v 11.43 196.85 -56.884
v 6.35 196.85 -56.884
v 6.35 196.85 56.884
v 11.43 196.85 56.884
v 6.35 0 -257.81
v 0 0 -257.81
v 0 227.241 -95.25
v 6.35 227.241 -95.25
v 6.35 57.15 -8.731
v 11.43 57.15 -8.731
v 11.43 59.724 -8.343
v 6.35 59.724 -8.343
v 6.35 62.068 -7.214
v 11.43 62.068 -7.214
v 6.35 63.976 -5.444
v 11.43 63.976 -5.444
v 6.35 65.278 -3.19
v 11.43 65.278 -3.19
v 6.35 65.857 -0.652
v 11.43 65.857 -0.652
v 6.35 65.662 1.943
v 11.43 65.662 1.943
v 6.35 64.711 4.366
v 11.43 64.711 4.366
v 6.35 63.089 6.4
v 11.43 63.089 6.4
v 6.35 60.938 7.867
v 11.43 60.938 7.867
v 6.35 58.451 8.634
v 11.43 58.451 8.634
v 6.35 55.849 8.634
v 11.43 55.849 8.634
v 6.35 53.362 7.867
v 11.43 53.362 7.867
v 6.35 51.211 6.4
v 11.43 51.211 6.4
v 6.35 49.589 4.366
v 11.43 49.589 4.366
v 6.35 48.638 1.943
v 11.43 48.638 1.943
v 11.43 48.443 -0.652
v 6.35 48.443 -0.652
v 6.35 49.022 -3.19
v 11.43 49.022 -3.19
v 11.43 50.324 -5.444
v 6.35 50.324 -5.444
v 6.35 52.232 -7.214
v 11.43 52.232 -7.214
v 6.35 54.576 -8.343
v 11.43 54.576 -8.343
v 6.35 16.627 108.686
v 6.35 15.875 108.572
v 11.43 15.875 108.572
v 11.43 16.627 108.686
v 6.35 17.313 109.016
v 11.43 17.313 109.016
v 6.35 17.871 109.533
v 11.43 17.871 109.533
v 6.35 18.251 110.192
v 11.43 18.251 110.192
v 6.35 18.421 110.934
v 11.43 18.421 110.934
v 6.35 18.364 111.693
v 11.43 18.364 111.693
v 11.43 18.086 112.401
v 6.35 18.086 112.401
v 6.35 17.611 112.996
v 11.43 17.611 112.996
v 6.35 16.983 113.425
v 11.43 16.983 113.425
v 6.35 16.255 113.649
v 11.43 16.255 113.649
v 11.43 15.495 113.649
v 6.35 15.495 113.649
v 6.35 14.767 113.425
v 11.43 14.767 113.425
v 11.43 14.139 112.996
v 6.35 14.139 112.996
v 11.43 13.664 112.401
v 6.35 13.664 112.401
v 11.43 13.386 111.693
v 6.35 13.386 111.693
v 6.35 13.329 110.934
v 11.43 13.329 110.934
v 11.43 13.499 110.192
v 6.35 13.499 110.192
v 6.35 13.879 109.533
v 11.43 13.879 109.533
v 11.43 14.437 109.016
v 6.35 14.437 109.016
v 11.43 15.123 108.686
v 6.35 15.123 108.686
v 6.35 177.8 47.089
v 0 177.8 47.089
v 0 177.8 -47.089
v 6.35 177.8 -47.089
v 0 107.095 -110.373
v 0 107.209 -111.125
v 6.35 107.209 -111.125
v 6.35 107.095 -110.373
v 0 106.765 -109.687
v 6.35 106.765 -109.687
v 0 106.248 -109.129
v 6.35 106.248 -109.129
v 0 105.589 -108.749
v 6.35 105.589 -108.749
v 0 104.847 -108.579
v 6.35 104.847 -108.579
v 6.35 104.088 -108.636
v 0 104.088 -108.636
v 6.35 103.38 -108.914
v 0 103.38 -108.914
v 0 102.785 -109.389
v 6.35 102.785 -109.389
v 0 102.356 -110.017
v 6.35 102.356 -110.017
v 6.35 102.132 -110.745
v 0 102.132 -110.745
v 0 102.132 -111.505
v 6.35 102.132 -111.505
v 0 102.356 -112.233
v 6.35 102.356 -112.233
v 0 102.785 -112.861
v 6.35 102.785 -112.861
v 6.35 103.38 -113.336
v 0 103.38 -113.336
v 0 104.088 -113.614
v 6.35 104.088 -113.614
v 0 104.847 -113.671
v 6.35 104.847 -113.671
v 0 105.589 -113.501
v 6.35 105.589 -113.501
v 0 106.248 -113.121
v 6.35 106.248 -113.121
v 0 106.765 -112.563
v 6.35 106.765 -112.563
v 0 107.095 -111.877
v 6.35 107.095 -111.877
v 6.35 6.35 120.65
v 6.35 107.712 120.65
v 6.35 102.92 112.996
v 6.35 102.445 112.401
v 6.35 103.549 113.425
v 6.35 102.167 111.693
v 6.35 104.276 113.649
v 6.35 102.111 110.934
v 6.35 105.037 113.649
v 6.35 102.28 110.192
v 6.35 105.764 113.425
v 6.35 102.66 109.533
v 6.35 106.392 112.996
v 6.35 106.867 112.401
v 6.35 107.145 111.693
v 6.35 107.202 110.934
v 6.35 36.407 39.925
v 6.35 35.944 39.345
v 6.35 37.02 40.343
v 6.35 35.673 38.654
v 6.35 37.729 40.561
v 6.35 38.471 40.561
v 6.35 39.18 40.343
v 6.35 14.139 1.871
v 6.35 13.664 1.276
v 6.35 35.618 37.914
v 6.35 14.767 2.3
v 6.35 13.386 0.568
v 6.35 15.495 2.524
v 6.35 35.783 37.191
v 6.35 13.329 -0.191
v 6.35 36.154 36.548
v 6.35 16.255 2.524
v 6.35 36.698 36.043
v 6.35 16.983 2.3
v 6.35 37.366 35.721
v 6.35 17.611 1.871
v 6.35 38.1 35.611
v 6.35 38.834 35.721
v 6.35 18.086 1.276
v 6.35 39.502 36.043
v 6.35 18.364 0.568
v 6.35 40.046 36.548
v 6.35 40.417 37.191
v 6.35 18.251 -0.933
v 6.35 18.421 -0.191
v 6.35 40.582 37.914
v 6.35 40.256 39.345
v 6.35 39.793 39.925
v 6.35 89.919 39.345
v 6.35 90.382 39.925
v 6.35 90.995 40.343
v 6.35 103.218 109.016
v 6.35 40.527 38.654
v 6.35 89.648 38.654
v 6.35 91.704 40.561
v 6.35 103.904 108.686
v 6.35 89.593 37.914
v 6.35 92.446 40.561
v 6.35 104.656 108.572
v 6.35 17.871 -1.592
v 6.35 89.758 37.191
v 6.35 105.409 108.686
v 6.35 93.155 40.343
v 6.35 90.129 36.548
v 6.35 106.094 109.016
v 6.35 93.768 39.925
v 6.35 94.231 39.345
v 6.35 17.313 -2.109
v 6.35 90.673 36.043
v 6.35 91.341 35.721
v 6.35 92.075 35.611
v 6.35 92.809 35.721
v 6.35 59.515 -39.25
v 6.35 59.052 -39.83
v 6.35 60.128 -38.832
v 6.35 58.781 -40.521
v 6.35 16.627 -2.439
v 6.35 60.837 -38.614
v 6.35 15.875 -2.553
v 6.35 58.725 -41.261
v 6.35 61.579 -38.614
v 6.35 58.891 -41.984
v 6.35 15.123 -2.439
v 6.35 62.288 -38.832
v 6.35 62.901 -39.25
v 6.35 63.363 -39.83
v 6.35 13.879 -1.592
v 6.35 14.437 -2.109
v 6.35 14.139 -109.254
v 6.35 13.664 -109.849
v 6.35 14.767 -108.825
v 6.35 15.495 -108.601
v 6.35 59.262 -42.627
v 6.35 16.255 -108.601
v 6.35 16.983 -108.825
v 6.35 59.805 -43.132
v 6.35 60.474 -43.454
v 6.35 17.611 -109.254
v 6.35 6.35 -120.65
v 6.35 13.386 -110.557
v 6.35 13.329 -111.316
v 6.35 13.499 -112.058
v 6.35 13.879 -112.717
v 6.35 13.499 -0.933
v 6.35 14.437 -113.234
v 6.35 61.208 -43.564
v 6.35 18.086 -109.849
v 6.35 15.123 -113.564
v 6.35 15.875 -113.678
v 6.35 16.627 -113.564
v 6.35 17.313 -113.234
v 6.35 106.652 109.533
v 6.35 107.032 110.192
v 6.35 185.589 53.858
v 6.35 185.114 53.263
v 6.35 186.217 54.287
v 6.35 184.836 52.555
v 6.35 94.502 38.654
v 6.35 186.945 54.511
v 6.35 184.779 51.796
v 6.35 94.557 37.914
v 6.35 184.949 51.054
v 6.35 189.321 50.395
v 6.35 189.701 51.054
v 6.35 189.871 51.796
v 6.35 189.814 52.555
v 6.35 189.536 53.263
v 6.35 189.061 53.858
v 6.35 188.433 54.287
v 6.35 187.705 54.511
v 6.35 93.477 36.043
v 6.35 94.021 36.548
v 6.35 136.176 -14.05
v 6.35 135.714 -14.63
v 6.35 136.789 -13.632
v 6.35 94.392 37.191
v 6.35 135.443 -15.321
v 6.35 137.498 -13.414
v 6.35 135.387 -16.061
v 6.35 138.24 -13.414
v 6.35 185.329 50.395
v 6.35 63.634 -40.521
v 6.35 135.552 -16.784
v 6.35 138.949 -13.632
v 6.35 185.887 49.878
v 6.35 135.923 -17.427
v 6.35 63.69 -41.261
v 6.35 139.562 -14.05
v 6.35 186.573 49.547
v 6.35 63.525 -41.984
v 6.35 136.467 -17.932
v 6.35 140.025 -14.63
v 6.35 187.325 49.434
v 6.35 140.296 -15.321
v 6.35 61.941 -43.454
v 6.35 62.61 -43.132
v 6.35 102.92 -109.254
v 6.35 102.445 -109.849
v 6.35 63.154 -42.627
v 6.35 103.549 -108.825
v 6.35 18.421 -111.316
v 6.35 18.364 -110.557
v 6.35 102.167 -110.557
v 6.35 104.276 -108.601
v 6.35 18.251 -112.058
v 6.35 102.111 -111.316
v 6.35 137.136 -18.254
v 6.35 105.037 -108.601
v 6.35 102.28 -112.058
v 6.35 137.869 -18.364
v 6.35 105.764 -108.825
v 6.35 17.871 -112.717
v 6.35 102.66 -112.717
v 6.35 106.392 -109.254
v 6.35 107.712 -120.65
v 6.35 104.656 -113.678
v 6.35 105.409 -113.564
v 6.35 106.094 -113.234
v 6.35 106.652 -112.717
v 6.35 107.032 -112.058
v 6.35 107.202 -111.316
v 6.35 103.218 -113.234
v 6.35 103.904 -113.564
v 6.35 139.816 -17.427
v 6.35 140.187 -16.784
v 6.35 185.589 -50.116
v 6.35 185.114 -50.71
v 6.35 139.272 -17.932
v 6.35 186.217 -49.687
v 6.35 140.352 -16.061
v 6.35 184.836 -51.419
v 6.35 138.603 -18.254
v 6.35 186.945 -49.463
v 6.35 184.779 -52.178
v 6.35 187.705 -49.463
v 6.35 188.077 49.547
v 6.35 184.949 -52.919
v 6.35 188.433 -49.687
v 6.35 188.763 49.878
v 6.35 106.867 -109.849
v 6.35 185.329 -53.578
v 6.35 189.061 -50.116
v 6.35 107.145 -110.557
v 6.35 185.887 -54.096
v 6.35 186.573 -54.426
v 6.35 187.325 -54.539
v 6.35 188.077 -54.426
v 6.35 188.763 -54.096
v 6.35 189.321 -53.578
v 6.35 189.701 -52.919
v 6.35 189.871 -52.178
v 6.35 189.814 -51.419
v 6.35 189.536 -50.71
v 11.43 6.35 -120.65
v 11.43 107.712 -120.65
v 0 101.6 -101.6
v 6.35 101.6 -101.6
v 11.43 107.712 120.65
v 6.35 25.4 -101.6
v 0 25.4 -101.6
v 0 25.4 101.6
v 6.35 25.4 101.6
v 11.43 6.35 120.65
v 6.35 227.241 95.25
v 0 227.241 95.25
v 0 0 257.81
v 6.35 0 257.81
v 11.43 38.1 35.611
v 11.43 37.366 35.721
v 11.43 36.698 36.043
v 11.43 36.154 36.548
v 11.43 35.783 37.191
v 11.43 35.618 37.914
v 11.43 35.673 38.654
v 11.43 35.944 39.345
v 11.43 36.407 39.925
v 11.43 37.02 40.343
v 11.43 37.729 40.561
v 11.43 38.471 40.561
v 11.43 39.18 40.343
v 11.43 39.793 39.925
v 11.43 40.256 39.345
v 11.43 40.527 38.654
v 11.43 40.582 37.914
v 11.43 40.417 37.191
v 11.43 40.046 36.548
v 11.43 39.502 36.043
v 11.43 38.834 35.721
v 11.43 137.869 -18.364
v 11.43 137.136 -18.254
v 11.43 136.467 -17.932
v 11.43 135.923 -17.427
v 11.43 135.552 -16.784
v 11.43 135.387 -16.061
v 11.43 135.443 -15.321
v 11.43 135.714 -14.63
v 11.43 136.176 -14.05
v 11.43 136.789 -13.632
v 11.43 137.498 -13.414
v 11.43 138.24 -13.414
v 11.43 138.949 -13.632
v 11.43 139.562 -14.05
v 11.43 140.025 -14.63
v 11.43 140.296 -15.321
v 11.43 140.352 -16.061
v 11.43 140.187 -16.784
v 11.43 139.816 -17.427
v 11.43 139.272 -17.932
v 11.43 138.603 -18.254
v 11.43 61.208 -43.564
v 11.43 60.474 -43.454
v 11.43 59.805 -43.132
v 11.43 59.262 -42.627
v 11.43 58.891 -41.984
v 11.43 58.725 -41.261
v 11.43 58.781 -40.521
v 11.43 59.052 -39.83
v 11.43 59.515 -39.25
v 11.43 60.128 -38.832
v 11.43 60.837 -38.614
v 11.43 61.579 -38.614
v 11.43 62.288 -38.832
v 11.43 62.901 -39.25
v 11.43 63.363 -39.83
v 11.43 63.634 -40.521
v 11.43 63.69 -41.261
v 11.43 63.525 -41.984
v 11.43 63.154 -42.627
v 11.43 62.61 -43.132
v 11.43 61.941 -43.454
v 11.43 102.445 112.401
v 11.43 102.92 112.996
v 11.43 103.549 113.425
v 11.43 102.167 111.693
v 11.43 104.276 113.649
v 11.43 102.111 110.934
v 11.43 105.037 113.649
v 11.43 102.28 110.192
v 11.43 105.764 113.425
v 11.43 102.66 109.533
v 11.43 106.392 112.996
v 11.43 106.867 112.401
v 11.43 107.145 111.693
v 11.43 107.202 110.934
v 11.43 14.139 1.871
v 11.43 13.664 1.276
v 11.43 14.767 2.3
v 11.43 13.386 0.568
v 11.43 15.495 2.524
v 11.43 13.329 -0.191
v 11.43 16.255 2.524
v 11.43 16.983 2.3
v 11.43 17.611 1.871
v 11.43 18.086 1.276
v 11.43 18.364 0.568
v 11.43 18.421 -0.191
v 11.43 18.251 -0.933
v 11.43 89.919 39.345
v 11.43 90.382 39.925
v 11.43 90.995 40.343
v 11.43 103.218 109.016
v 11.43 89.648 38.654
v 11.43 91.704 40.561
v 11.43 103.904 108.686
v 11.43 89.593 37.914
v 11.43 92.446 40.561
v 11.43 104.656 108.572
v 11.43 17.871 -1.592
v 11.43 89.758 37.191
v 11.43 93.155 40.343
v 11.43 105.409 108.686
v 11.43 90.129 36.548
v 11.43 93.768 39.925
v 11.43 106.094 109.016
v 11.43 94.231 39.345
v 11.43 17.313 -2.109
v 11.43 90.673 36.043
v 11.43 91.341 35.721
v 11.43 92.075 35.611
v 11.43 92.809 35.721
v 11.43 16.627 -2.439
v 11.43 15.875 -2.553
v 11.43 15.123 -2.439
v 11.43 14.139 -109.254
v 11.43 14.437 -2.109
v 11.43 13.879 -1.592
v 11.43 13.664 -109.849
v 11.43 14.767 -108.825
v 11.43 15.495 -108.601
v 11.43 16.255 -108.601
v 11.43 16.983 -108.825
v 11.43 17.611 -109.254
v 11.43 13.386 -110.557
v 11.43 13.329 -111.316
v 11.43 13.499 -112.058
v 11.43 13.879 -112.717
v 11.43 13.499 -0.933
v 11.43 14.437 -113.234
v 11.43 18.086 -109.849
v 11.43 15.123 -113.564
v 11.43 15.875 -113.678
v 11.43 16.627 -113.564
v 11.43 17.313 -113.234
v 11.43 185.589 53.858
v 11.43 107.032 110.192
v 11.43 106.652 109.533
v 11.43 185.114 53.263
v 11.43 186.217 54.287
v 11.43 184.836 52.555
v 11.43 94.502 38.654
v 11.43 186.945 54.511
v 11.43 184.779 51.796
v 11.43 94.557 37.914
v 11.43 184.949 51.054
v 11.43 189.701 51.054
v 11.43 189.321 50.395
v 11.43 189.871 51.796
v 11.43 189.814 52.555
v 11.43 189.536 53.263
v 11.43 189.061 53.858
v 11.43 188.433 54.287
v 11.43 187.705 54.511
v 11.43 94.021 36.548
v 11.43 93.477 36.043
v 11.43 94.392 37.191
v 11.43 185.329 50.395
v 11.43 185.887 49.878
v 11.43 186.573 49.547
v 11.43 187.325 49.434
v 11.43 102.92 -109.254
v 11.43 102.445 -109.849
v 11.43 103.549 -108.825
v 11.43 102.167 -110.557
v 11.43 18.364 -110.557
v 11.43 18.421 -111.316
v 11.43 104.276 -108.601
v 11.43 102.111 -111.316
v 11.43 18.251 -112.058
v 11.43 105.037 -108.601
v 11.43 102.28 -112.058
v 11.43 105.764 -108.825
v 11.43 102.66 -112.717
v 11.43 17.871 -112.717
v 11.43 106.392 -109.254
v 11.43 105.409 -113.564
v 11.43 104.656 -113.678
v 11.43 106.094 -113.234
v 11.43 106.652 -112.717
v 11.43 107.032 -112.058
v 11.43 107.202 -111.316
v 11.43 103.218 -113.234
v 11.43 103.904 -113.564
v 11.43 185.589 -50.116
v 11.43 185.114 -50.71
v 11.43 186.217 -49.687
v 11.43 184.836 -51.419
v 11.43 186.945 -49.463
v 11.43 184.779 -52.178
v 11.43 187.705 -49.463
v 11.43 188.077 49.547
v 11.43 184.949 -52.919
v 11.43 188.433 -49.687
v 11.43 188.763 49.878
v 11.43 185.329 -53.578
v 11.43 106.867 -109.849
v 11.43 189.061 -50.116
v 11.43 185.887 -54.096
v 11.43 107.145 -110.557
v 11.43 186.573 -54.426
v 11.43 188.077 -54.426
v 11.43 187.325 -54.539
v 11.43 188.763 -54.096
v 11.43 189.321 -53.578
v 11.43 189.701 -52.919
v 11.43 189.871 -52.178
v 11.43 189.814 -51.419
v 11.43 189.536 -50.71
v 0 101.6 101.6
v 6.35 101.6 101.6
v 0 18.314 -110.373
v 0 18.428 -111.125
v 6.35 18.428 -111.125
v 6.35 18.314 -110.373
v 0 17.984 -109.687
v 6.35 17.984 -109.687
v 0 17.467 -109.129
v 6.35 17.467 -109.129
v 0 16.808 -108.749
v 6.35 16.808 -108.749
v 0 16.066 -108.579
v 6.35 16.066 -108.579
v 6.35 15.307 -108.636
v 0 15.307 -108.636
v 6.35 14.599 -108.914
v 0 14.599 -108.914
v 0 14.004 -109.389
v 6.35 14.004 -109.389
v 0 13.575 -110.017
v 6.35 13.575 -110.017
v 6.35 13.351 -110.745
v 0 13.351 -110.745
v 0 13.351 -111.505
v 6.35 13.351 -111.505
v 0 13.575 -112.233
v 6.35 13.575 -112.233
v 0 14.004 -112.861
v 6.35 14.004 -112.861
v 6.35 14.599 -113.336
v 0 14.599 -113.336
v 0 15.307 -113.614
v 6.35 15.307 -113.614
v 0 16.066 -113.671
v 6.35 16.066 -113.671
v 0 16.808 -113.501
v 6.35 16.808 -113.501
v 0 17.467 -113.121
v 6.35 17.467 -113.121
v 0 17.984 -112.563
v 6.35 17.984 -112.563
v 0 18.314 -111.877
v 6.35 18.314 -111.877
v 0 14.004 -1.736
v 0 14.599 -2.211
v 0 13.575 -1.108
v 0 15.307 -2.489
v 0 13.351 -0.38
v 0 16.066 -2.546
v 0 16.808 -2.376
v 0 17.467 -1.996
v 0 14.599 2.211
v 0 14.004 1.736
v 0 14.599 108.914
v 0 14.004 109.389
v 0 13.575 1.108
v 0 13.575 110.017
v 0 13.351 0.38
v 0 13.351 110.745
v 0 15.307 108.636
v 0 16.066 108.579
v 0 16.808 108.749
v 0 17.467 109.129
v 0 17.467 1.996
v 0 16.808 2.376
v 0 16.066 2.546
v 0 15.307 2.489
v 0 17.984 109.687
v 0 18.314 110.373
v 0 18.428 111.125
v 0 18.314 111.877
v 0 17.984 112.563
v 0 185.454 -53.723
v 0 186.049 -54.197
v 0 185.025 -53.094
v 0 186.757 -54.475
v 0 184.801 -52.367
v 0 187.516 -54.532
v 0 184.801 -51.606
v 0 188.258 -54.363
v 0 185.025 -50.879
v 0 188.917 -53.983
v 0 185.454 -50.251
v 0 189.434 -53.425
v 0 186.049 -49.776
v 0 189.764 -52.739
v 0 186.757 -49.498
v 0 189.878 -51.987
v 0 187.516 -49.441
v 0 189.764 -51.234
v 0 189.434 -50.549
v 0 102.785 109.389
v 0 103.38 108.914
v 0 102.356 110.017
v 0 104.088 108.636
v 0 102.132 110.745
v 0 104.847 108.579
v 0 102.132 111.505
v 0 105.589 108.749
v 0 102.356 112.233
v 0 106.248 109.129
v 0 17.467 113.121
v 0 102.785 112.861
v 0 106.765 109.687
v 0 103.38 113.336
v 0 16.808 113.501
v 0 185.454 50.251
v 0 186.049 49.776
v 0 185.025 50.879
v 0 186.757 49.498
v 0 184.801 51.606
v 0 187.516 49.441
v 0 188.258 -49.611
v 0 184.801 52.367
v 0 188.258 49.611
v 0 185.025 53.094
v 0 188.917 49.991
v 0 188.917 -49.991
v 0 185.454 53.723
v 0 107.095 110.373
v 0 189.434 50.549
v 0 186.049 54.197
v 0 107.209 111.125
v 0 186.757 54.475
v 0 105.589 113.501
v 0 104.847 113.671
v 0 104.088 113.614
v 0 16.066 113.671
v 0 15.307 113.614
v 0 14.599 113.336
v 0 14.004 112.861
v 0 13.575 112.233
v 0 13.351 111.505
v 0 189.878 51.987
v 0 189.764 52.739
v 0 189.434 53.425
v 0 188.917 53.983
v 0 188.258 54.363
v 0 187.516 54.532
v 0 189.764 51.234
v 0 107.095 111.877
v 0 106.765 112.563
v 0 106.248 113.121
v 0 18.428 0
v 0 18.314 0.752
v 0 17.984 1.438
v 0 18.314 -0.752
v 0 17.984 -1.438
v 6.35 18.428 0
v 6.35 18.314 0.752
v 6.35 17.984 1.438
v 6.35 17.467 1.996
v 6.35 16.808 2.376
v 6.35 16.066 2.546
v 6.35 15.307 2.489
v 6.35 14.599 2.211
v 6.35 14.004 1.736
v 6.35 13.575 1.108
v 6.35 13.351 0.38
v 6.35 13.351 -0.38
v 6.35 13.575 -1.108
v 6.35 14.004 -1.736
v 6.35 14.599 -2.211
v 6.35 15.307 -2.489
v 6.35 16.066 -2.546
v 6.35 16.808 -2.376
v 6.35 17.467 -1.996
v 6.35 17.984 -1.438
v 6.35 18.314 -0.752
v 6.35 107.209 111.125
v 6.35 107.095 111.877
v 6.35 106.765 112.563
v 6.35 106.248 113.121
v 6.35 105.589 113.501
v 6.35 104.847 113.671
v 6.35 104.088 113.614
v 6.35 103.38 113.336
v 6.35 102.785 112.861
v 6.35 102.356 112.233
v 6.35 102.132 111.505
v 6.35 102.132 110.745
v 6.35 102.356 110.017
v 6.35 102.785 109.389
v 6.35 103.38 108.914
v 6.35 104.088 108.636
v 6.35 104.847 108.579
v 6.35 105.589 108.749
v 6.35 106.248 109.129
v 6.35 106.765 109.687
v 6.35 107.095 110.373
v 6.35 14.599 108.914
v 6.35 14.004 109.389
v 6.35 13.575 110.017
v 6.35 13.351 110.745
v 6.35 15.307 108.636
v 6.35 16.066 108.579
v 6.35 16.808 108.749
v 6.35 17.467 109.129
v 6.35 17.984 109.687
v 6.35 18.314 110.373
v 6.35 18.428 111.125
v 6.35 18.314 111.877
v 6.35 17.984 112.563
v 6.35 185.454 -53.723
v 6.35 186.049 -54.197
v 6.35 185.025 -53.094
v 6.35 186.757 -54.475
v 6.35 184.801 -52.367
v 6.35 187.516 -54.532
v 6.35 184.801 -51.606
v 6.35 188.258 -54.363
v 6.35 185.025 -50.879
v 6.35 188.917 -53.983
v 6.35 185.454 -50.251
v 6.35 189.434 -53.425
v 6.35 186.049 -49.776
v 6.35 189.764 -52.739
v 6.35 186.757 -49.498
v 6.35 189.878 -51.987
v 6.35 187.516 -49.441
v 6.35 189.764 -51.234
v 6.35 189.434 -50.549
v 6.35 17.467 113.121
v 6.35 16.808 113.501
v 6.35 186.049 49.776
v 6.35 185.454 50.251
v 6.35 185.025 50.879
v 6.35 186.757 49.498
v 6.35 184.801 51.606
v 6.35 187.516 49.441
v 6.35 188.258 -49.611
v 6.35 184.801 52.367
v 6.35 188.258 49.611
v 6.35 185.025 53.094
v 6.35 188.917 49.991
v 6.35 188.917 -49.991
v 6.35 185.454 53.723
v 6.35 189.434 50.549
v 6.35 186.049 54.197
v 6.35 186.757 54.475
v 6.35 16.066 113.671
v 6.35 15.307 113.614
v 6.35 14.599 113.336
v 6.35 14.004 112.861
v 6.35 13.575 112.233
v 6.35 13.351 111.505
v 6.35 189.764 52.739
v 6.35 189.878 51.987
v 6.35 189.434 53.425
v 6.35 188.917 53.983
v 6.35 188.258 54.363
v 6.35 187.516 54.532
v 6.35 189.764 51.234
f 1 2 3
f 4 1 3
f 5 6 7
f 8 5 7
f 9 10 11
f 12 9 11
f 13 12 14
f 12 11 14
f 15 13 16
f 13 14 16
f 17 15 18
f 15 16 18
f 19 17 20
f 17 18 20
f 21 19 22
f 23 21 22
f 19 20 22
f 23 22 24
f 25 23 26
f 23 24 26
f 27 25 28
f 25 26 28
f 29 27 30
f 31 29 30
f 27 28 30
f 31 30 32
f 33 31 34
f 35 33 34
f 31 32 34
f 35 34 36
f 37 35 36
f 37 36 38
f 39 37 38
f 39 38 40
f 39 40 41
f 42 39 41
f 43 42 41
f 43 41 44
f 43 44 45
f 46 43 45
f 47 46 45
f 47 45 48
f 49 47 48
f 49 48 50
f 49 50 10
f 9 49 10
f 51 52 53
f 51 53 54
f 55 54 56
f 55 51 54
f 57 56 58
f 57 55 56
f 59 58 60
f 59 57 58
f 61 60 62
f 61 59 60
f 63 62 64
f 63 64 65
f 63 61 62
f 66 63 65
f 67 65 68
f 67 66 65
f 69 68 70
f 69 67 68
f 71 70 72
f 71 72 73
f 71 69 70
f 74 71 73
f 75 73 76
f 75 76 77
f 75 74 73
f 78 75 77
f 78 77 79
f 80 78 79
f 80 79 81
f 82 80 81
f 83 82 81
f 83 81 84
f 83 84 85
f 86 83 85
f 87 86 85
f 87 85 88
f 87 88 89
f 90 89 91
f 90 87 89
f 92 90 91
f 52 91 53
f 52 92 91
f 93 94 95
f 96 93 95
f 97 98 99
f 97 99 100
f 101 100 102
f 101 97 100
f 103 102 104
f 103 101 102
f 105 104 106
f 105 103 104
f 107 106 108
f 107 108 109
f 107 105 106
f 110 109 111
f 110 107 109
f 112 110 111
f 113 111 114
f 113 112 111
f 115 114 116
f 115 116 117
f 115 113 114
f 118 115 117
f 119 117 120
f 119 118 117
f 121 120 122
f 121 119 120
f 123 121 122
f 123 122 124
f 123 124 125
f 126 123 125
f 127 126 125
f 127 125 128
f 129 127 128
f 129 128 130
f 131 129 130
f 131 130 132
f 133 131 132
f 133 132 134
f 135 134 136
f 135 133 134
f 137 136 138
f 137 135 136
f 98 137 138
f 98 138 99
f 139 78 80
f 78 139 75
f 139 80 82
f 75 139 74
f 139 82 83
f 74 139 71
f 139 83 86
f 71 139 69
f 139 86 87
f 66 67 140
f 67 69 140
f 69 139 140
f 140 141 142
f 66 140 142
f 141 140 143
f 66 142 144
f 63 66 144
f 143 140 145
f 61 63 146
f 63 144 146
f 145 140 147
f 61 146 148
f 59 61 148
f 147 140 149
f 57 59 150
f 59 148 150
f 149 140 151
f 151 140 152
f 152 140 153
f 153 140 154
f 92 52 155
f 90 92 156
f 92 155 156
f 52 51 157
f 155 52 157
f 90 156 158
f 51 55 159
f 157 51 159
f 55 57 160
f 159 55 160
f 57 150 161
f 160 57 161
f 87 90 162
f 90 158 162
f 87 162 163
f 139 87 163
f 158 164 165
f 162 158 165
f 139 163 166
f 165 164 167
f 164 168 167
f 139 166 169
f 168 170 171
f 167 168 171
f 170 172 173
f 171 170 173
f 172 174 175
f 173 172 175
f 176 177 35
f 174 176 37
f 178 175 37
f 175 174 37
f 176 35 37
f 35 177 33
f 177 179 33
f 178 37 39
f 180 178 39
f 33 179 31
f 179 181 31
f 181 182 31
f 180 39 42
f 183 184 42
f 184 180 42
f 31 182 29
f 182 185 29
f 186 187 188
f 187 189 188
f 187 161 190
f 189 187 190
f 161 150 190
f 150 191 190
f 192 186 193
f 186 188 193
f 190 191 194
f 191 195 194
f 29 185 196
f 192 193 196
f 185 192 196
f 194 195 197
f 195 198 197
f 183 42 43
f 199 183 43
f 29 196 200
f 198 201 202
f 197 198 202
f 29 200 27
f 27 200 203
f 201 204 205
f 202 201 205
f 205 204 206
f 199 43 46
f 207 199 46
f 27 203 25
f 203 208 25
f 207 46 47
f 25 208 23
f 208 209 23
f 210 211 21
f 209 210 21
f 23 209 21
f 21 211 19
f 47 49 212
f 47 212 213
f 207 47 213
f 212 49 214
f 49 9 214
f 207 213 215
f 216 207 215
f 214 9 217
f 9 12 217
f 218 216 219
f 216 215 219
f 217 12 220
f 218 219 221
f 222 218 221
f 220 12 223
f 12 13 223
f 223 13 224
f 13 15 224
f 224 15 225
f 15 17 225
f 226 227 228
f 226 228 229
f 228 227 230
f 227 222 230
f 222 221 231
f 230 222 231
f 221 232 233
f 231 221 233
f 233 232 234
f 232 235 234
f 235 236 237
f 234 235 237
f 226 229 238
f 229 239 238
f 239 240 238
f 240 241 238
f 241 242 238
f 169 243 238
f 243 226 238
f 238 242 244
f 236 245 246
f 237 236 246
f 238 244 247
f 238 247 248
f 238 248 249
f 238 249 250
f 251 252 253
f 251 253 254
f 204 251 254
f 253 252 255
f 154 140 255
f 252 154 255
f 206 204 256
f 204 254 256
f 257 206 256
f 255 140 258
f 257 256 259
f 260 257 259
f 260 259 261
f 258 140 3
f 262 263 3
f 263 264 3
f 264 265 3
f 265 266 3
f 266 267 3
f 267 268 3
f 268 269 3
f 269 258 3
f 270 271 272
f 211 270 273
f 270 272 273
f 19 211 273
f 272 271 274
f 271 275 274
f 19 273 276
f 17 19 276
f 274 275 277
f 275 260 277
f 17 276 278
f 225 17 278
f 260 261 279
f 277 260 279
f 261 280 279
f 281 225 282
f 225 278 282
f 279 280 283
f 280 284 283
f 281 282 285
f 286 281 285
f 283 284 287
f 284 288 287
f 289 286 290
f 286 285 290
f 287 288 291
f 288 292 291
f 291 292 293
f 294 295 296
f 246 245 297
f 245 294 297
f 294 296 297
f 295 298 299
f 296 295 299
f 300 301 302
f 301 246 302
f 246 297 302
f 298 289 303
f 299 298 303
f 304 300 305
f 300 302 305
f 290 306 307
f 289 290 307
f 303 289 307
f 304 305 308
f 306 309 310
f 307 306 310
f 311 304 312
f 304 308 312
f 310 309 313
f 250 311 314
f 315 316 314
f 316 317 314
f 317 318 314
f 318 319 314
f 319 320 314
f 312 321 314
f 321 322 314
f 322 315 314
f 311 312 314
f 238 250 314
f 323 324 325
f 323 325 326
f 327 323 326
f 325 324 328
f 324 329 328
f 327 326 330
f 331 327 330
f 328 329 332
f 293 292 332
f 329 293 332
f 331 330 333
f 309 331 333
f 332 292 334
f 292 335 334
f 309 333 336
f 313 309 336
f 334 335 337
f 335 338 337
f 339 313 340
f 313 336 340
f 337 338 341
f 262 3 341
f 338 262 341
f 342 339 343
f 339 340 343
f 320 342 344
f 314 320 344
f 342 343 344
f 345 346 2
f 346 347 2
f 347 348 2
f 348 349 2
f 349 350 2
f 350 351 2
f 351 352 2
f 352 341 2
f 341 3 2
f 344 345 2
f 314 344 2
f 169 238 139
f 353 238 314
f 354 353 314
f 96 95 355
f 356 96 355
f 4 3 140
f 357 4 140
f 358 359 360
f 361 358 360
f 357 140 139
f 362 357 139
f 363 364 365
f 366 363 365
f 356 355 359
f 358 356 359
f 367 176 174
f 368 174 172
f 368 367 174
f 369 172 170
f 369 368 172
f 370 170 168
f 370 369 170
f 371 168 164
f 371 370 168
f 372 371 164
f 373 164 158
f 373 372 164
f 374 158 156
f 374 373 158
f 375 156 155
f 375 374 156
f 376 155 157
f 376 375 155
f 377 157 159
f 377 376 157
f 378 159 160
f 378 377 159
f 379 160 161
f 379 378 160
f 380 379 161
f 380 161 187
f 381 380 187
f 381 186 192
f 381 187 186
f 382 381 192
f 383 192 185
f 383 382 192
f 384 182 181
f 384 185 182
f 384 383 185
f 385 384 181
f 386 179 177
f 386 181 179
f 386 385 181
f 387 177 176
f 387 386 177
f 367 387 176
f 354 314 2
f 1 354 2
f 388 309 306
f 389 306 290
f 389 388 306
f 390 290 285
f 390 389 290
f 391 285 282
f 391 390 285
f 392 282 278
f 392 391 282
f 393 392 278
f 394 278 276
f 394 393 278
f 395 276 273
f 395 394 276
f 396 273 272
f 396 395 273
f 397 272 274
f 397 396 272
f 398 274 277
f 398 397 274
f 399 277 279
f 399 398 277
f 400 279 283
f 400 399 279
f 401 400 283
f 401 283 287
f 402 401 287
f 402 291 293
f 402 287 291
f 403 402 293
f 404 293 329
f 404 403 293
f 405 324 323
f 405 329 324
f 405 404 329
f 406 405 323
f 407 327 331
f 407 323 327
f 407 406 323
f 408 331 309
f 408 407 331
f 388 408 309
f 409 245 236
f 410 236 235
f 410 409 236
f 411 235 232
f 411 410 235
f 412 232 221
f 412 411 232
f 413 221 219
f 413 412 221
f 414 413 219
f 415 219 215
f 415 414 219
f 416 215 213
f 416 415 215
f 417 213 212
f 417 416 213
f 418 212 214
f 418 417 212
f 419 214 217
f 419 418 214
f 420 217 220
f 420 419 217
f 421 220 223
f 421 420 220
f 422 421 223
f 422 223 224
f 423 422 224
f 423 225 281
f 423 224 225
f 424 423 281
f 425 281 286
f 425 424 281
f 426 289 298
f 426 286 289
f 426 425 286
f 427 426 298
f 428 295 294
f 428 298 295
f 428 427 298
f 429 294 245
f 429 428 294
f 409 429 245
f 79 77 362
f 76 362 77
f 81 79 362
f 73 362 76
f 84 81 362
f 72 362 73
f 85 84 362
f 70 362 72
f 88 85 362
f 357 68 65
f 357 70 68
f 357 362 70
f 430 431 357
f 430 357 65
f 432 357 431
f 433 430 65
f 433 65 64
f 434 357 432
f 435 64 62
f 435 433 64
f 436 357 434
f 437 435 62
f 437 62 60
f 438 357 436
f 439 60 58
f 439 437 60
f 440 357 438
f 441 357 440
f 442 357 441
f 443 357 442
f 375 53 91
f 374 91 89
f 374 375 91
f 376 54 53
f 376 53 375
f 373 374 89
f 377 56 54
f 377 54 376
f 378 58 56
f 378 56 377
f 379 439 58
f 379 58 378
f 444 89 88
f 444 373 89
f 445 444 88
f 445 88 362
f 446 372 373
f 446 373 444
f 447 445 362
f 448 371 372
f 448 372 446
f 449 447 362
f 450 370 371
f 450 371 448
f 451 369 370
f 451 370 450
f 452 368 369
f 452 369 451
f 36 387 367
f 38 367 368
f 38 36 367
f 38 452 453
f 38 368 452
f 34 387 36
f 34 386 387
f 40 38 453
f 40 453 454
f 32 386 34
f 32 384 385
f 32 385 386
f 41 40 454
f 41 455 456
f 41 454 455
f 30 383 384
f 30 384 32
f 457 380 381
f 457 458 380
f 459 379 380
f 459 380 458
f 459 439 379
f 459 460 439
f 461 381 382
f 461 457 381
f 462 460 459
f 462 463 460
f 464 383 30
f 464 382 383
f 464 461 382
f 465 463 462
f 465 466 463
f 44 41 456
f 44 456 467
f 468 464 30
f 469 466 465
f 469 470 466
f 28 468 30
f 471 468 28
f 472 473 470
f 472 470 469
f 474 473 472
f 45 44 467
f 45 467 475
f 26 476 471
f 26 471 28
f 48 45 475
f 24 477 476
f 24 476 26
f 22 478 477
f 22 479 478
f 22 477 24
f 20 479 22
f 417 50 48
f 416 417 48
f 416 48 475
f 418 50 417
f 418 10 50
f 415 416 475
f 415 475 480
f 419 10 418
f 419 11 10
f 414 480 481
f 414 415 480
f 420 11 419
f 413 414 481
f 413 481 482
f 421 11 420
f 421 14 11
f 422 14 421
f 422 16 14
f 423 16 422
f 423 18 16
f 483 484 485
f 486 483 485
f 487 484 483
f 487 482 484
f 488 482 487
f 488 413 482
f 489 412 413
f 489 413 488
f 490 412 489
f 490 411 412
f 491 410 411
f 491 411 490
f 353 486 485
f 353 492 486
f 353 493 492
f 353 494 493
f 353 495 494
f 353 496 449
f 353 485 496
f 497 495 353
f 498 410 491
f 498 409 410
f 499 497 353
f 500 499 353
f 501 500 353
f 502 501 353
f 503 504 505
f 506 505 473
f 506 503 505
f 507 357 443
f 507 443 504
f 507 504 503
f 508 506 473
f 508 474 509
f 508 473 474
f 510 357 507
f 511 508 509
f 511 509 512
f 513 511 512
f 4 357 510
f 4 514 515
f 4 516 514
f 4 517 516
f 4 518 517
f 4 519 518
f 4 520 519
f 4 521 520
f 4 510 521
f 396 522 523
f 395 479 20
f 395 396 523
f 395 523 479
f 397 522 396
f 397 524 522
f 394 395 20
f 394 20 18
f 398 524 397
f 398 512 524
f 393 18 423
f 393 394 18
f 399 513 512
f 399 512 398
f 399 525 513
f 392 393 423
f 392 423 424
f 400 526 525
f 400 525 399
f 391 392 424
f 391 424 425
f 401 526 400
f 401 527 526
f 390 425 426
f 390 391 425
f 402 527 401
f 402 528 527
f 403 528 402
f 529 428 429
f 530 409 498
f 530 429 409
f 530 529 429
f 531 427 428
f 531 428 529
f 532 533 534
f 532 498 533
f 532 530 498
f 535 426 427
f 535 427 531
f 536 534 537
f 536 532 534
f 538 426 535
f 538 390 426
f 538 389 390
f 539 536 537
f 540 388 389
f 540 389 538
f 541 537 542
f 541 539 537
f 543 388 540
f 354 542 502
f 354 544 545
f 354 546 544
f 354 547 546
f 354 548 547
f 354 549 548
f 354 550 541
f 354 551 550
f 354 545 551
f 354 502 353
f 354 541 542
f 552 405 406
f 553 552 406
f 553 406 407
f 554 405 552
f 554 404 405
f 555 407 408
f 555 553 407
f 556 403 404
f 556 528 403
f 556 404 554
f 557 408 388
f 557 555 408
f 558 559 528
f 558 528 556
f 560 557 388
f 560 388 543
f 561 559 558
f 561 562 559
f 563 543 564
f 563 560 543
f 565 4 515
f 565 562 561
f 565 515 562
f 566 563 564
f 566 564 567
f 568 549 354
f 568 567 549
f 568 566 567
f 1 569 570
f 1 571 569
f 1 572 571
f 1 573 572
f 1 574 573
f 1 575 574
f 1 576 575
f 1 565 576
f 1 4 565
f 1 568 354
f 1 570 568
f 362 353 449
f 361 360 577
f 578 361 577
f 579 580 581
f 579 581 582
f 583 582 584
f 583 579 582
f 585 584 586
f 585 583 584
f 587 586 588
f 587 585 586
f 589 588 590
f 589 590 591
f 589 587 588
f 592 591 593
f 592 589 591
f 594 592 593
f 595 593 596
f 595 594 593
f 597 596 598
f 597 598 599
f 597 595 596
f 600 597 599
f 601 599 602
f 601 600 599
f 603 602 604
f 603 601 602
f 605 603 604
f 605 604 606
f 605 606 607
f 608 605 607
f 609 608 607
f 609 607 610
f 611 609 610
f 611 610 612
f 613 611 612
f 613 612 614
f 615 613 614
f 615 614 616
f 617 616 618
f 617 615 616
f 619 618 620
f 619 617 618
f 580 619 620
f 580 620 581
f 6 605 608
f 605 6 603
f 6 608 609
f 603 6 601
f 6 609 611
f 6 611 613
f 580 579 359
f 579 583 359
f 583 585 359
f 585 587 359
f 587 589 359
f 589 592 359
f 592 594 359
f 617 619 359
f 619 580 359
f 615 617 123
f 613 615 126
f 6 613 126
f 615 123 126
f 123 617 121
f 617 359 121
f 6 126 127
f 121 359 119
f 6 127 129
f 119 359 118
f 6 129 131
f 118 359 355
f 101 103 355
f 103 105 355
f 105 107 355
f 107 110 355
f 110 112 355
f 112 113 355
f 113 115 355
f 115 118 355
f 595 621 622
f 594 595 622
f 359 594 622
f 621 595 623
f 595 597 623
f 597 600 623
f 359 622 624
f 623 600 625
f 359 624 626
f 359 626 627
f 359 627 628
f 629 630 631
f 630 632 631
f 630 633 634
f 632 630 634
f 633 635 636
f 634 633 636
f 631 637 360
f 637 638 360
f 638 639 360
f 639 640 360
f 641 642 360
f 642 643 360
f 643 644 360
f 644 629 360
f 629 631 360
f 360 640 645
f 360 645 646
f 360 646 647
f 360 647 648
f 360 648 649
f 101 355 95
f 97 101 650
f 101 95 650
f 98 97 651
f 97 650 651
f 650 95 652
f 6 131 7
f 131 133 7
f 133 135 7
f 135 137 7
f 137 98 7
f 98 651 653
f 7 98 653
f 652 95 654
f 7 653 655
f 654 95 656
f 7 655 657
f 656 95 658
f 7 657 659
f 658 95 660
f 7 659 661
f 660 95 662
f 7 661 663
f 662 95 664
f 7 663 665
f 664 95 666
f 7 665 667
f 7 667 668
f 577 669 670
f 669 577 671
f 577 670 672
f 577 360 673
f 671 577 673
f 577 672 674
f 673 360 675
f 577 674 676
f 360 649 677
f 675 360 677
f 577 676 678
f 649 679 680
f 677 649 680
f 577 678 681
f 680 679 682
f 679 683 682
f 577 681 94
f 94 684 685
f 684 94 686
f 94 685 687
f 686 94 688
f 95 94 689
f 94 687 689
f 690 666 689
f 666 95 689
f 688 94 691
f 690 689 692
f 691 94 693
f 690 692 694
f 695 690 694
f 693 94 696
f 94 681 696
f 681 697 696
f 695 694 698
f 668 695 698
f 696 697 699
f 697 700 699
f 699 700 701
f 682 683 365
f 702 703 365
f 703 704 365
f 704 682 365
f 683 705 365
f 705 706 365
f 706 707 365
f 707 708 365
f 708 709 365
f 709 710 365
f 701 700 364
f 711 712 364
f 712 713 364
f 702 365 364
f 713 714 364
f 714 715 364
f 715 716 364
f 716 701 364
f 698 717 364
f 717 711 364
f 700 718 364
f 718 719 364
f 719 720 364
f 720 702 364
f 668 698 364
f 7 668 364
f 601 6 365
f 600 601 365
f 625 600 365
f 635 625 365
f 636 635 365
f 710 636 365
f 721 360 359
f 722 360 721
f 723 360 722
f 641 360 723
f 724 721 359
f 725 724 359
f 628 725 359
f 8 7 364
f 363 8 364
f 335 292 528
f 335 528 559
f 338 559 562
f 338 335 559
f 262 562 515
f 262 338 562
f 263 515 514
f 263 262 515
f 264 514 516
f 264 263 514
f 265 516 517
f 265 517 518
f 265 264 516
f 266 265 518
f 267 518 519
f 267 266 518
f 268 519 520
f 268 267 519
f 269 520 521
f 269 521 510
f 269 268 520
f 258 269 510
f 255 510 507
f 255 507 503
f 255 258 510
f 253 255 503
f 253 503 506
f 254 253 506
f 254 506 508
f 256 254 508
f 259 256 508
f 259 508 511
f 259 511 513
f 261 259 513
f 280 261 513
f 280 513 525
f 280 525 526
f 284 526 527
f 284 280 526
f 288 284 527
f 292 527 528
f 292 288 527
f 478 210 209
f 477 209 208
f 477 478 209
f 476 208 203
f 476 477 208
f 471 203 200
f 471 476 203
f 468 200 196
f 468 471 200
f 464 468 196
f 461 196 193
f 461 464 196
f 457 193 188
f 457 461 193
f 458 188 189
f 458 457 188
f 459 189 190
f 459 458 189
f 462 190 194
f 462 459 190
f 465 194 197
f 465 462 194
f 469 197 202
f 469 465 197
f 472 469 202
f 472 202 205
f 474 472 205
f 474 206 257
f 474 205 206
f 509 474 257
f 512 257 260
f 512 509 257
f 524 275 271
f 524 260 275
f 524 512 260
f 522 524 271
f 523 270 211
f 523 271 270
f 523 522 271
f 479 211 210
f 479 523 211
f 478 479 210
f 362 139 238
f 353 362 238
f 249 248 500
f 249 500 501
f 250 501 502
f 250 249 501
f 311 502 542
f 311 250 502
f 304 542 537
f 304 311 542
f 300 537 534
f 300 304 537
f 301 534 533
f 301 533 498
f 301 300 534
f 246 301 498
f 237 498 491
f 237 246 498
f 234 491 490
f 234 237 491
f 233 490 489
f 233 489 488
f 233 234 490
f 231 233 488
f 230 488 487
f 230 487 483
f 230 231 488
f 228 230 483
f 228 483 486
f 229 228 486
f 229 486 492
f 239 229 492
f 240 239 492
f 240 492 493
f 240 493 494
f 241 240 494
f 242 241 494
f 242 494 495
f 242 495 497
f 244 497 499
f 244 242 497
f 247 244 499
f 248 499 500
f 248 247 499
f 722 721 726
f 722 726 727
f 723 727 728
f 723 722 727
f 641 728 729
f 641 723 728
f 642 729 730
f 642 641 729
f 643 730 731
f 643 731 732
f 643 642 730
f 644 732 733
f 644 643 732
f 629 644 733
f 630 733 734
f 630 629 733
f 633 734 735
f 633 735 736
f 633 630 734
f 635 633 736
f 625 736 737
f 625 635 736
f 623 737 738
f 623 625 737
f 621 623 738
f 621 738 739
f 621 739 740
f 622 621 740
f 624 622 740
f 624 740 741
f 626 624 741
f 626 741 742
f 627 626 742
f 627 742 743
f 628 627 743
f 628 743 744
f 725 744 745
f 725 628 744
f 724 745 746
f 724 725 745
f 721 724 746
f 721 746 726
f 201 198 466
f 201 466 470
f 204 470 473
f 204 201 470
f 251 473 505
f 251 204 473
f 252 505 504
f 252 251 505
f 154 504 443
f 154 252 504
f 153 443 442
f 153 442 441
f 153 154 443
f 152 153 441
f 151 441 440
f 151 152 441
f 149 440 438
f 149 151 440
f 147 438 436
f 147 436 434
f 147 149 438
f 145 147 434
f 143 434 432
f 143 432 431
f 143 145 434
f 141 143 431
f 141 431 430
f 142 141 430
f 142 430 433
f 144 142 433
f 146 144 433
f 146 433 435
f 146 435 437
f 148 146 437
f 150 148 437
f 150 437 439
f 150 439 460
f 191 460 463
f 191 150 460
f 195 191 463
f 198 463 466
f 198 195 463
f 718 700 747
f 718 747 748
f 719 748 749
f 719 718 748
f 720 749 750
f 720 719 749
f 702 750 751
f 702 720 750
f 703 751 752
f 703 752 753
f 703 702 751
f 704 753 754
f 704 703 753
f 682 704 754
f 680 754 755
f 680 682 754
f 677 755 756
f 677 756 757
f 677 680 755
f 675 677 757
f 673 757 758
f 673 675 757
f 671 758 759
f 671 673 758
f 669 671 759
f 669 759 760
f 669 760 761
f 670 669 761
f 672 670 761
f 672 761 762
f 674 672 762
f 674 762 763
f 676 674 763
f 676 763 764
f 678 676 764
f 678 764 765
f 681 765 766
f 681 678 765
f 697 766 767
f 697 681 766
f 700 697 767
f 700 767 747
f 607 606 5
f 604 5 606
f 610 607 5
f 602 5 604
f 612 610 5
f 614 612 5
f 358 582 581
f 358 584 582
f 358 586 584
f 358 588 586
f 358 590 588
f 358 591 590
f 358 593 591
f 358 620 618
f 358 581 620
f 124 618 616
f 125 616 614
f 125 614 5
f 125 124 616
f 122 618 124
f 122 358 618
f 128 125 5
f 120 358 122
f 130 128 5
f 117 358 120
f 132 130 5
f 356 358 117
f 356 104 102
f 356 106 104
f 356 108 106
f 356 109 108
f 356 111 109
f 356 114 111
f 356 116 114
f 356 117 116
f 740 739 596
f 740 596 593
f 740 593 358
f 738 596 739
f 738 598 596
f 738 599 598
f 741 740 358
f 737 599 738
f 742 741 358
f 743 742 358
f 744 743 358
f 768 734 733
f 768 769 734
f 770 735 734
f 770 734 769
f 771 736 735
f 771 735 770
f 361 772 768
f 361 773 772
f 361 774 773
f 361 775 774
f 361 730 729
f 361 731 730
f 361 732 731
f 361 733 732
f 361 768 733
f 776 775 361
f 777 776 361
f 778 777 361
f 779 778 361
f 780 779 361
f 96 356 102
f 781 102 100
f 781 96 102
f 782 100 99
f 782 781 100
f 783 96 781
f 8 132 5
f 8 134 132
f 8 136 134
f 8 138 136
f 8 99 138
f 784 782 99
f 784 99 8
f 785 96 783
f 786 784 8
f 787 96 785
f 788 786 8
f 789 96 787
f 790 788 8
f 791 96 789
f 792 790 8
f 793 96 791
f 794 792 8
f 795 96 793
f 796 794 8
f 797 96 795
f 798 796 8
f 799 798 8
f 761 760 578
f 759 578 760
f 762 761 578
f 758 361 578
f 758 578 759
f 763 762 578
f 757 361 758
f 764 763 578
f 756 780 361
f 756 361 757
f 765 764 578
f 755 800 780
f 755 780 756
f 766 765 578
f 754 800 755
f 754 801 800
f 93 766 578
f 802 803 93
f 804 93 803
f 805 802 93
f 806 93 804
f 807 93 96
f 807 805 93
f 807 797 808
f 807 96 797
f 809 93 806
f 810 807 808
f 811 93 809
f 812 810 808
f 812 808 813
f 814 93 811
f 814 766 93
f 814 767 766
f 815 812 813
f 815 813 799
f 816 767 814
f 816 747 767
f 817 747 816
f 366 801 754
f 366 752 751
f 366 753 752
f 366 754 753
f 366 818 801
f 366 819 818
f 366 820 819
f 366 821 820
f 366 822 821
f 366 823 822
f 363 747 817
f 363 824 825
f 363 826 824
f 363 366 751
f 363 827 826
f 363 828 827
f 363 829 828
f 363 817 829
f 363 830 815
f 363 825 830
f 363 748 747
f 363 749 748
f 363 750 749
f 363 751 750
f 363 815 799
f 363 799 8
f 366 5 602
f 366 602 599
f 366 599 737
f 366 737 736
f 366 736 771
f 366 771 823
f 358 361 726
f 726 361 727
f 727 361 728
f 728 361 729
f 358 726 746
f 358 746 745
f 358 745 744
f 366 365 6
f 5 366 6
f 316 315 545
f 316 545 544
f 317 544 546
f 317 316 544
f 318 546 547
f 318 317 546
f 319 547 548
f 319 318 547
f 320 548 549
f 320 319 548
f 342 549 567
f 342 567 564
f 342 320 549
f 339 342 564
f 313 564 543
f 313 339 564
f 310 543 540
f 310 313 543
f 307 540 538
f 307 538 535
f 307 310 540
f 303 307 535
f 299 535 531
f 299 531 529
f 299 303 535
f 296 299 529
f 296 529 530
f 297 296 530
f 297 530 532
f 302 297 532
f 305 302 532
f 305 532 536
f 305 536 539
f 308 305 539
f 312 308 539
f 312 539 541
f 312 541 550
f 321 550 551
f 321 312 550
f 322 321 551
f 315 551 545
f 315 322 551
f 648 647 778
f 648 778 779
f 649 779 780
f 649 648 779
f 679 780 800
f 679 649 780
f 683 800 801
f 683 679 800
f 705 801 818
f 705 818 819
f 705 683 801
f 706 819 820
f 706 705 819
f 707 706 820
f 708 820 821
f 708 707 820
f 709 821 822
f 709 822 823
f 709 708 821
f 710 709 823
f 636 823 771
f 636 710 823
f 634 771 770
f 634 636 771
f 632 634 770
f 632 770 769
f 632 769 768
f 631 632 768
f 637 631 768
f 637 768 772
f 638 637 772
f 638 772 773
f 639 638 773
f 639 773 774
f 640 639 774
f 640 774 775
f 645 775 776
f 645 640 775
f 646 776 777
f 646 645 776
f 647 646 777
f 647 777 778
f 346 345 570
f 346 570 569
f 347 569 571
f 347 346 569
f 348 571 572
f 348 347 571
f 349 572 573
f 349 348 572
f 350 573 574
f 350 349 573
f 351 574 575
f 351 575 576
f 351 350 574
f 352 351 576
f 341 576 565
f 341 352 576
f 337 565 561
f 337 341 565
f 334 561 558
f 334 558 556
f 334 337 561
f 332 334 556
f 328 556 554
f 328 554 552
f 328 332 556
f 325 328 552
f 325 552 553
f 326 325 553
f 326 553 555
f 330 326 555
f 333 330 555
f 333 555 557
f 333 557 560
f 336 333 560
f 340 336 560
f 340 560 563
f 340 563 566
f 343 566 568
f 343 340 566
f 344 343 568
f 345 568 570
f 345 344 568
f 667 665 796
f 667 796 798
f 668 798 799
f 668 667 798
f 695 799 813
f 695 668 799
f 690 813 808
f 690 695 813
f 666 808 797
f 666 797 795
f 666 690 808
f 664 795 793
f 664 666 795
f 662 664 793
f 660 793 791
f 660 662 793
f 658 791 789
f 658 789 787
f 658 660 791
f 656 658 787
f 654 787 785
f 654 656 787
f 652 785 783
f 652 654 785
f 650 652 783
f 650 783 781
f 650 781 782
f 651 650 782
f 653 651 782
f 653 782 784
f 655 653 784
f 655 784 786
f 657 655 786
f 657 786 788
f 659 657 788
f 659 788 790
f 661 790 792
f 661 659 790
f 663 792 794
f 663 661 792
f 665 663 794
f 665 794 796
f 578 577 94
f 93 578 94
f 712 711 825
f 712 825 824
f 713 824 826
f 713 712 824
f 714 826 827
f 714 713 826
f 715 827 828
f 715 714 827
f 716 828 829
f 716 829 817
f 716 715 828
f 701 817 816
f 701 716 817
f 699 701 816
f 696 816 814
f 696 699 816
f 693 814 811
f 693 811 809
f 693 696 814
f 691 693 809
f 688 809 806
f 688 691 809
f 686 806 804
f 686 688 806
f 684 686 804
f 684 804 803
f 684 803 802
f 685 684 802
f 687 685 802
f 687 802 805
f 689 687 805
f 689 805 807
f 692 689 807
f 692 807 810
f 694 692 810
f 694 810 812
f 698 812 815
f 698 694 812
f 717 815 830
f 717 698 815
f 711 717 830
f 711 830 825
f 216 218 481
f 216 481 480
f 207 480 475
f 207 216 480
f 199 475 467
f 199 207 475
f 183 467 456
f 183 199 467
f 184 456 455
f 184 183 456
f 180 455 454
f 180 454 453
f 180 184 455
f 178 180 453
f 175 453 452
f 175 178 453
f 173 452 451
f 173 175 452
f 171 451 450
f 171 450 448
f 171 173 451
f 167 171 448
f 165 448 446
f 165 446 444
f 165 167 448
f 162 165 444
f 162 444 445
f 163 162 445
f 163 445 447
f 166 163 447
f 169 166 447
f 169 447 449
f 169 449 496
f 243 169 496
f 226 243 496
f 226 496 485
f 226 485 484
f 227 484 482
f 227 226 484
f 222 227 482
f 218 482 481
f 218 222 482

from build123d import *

# Parameters (mm, degrees)
ANGLEDBALLAST_DECKFRONT_OUTLINE_R = 2.5527
ANGLEDBALLAST_DECKFRONT_DEPTH     = 6.35
SKETCH1_R                         = 2.5527
BOSS_EXTRUDE1_DEPTH               = 5.08
SKETCH2_R                         = 8.73125
CUT_EXTRUDE1_DEPTH                = 344.853526084
F_10_CLEARANCE_HOLE1_AT_2_COUNT   = 2
F_10_CLEARANCE_HOLE1_AT_2_PITCH   = 53.975
F_10_CLEARANCE_HOLE1_AT_3_COUNT   = 2
F_10_CLEARANCE_HOLE1_AT_3_PITCH   = 113.433816282
F_10_CLEARANCE_HOLE1_AT_4_COUNT   = 2
F_10_CLEARANCE_HOLE1_AT_4_PITCH   = 82.478211039


# Read off the part's stored shape, not the designer's step: AngledBallast_DeckFront
with BuildPart() as part:
    # AngledBallast_DeckFront outline → AngledBallast_DeckFront (new body)
    with BuildSketch(Plane.YZ):
        Polygon((227.241295543, 95.25), (0, 257.81), (0, -257.81), (227.241295543, -95.25), align=None)
        with Locations((15.875, -111.125)):
            Circle(ANGLEDBALLAST_DECKFRONT_OUTLINE_R, mode=Mode.SUBTRACT)
        with Locations((104.656174089, -111.125)):
            Circle(ANGLEDBALLAST_DECKFRONT_OUTLINE_R, mode=Mode.SUBTRACT)
        with Locations((187.325, -51.986786112)):
            Circle(ANGLEDBALLAST_DECKFRONT_OUTLINE_R, mode=Mode.SUBTRACT)
        with Locations((15.875, 0)):
            Circle(ANGLEDBALLAST_DECKFRONT_OUTLINE_R, mode=Mode.SUBTRACT)
        with Locations((15.875, 111.125)):
            Circle(ANGLEDBALLAST_DECKFRONT_OUTLINE_R, mode=Mode.SUBTRACT)
        Polygon((101.6, -101.6), (25.4, -101.6), (25.4, 101.6), (101.6, 101.6), (177.8, 47.089344398), (177.8, -47.089344398), align=None, mode=Mode.SUBTRACT)
        with Locations((104.656174089, 111.125)):
            Circle(ANGLEDBALLAST_DECKFRONT_OUTLINE_R, mode=Mode.SUBTRACT)
        with Locations((187.325, 51.986786112)):
            Circle(ANGLEDBALLAST_DECKFRONT_OUTLINE_R, mode=Mode.SUBTRACT)
    extrude(amount=ANGLEDBALLAST_DECKFRONT_DEPTH)


with BuildPart() as body_2:
    # Sketch1 → Boss-Extrude1 (new body)
    with BuildSketch(Plane(origin=(6.35, 0, 0), x_dir=(0, 0, -1), z_dir=(1, 0, 0))):
        Polygon((120.65, 107.712348179), (56.884227826, 196.85), (-56.884227826, 196.85), (-120.65, 107.712348179), (-120.65, 6.35), (120.65, 6.35), align=None)
        with Locations((51.986786112, 187.325)):
            Circle(SKETCH1_R, mode=Mode.SUBTRACT)
        with Locations((111.125, 104.656174089)):
            Circle(SKETCH1_R, mode=Mode.SUBTRACT)
        with Locations((0, 15.875)):
            Circle(SKETCH1_R, mode=Mode.SUBTRACT)
        with Locations((111.125, 15.875)):
            Circle(SKETCH1_R, mode=Mode.SUBTRACT)
        with Locations((-111.125, 15.875)):
            Circle(SKETCH1_R, mode=Mode.SUBTRACT)
        with Locations((-111.125, 104.656174089)):
            Circle(SKETCH1_R, mode=Mode.SUBTRACT)
        with Locations((-51.986786112, 187.325)):
            Circle(SKETCH1_R, mode=Mode.SUBTRACT)
    extrude(amount=BOSS_EXTRUDE1_DEPTH)

    # Sketch2 → Cut-Extrude1 (cut, through all)
    with BuildSketch(Plane(origin=(11.43, 0, 0), x_dir=(0, 0, -1), z_dir=(1, 0, 0))):
        with Locations((0, 57.15)):
            Circle(SKETCH2_R)
    extrude(amount=-CUT_EXTRUDE1_DEPTH, mode=Mode.SUBTRACT)

    # Sketch5 → #10 Clearance Hole1 (revolve, cut)
    with BuildSketch(Plane(origin=(11.43, 38.1, 38.1), x_dir=(0, 0, -1), z_dir=(0, 1, 0))):
        Polygon((0, 0), (0, 13.433662253), (2.4892, 11.938), (2.4892, 0), align=None)
    f_10_clearance_hole1 = revolve(axis=Axis((17.78, 38.1, 38.1), (-1, 0, 0)), mode=Mode.SUBTRACT)

    # #10 Clearance Hole1 at 2: #10 Clearance Hole1 ×2
    with Locations(*[(0, i * F_10_CLEARANCE_HOLE1_AT_2_PITCH, 0) for i in range(1, F_10_CLEARANCE_HOLE1_AT_2_COUNT)]):
        add(f_10_clearance_hole1, mode=Mode.SUBTRACT)

    # #10 Clearance Hole1 at 3: #10 Clearance Hole1 ×2
    with Locations(*[Vector(0, 0.8795382859241794, -0.4758281240044103) * (i * F_10_CLEARANCE_HOLE1_AT_3_PITCH) for i in range(1, F_10_CLEARANCE_HOLE1_AT_3_COUNT)]):
        add(f_10_clearance_hole1, mode=Mode.SUBTRACT)

    # #10 Clearance Hole1 at 4: #10 Clearance Hole1 ×2
    with Locations(*[Vector(0, 0.28016697011361824, -0.9599512846271706) * (i * F_10_CLEARANCE_HOLE1_AT_4_PITCH) for i in range(1, F_10_CLEARANCE_HOLE1_AT_4_COUNT)]):
        add(f_10_clearance_hole1, mode=Mode.SUBTRACT)


solid = Compound([part.part, body_2.part])
